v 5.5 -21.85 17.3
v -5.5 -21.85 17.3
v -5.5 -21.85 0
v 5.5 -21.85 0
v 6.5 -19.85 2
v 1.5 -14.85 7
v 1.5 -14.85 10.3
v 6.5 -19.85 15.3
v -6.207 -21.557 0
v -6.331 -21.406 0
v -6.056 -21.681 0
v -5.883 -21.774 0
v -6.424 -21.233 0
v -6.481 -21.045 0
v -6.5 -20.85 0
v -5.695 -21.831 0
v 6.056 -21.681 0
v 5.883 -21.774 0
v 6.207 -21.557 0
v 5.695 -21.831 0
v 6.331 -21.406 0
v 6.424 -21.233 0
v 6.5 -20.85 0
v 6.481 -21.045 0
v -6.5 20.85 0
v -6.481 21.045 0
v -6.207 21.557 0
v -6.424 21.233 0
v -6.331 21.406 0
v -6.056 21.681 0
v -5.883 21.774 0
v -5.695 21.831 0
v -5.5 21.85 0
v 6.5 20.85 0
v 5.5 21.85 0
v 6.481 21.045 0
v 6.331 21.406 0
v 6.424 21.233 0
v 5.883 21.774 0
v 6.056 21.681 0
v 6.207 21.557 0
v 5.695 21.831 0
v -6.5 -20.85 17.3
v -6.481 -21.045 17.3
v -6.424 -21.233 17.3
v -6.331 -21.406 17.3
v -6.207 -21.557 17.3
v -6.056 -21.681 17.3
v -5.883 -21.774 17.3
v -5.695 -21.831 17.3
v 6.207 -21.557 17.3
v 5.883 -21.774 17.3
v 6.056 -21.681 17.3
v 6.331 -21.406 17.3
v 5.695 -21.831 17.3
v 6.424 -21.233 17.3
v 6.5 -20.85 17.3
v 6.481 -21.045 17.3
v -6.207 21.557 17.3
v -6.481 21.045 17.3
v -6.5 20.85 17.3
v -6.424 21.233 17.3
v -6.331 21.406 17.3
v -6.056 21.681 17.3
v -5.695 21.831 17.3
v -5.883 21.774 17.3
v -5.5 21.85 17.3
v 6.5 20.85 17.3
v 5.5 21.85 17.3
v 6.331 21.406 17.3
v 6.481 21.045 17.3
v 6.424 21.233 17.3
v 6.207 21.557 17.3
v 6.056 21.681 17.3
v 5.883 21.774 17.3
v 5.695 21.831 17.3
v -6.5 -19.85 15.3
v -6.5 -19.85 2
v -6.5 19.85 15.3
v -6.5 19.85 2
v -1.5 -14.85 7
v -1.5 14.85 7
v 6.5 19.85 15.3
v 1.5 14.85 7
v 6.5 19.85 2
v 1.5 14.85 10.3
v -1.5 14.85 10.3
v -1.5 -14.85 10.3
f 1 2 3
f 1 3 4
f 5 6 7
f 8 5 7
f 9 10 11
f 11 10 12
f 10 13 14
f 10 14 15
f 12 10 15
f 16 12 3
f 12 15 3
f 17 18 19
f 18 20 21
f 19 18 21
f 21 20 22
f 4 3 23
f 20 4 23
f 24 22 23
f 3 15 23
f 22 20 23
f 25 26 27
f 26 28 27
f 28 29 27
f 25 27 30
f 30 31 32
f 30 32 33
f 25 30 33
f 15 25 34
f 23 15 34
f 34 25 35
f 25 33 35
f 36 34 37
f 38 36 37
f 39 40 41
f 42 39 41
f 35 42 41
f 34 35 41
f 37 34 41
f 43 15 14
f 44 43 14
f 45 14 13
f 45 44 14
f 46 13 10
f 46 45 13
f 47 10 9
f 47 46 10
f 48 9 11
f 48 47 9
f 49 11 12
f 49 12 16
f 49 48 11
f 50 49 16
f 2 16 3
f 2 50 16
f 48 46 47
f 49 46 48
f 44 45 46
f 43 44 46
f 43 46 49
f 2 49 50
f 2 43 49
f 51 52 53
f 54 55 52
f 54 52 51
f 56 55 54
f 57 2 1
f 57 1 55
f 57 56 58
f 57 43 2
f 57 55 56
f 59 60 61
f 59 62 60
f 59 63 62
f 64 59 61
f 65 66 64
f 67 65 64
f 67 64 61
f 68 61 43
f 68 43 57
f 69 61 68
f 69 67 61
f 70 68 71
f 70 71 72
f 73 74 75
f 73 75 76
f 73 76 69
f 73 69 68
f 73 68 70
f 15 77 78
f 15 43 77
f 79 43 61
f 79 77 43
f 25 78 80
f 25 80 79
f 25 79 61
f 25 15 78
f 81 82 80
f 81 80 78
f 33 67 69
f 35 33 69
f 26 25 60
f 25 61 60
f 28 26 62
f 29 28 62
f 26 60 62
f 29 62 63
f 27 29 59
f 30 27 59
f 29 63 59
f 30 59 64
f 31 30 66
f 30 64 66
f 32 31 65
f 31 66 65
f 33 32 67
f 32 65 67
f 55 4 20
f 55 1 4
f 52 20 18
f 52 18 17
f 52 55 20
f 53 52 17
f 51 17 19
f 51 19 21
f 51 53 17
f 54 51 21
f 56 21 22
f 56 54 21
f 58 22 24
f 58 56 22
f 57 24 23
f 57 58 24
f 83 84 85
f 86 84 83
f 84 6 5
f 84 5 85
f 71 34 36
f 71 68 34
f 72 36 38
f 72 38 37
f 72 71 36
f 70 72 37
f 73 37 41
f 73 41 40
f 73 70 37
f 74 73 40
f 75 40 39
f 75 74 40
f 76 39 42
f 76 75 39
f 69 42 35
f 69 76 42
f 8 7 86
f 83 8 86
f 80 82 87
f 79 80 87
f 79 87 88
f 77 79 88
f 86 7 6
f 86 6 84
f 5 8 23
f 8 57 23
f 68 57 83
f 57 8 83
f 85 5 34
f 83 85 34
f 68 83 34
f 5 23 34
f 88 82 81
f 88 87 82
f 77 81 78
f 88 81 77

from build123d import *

# Parameters (mm, degrees)
F0_W     = 13
F0_H     = 43.7
F1_DEPTH = 17.3
F2_R     = 1
F3_W     = 39.7
F3_H     = 13.3
F5_DEPTH = 5
F4_W     = 39.7
F4_H     = 13.3
F6_DEPTH = 5
F7_SIZE  = 4.99999


# Not quite as in the source:
# - a fillet or chamfer is up to 0.001 mm smaller than in the source, because OpenCascade refuses the exact size


with BuildPart() as f1:
    # F0 (on Top) → F1 (new body)
    with BuildSketch(Plane.XY):
        Rectangle(F0_W, F0_H)
    extrude(amount=F1_DEPTH)

    # F2
    f2_edges = [f1.edges().sort_by_distance(p)[0] for p in [
        (-6.5, 21.85, 8.65),
        (6.5, 21.85, 8.65),
        (-6.5, -21.85, 8.65),
        (6.5, -21.85, 8.65),
    ]]
    fillet(f2_edges, radius=F2_R)

    # F3 (on face) → F5 (cut)
    with BuildSketch(Plane.YZ.offset(6.5)):
        with Locations((0, 8.65)):
            Rectangle(F3_W, F3_H)
    extrude(amount=-F5_DEPTH, mode=Mode.SUBTRACT)

    # F4 (on face) → F6 (cut)
    with BuildSketch(Plane(origin=(-6.5, 0, 0), x_dir=(0, -1, 0), z_dir=(-1, 0, 0))):
        with Locations((0, 8.65)):
            Rectangle(F4_W, F4_H)
    extrude(amount=-F6_DEPTH, mode=Mode.SUBTRACT)

    # F7 (size 5 in the source; OpenCascade refuses exactly that, so slightly less here)
    f7_edges = [f1.edges().sort_by_distance(p)[0] for p in [
        (-1.5, 0, 2),
        (-1.5, 19.85, 8.65),
        (-1.5, 0, 15.3),
        (-1.5, -19.85, 8.65),
        (1.5, 19.85, 8.65),
        (1.5, 0, 2),
        (1.5, -19.85, 8.65),
        (1.5, 0, 15.3),
    ]]
    chamfer(f7_edges, length=F7_SIZE)


solid = f1.part
